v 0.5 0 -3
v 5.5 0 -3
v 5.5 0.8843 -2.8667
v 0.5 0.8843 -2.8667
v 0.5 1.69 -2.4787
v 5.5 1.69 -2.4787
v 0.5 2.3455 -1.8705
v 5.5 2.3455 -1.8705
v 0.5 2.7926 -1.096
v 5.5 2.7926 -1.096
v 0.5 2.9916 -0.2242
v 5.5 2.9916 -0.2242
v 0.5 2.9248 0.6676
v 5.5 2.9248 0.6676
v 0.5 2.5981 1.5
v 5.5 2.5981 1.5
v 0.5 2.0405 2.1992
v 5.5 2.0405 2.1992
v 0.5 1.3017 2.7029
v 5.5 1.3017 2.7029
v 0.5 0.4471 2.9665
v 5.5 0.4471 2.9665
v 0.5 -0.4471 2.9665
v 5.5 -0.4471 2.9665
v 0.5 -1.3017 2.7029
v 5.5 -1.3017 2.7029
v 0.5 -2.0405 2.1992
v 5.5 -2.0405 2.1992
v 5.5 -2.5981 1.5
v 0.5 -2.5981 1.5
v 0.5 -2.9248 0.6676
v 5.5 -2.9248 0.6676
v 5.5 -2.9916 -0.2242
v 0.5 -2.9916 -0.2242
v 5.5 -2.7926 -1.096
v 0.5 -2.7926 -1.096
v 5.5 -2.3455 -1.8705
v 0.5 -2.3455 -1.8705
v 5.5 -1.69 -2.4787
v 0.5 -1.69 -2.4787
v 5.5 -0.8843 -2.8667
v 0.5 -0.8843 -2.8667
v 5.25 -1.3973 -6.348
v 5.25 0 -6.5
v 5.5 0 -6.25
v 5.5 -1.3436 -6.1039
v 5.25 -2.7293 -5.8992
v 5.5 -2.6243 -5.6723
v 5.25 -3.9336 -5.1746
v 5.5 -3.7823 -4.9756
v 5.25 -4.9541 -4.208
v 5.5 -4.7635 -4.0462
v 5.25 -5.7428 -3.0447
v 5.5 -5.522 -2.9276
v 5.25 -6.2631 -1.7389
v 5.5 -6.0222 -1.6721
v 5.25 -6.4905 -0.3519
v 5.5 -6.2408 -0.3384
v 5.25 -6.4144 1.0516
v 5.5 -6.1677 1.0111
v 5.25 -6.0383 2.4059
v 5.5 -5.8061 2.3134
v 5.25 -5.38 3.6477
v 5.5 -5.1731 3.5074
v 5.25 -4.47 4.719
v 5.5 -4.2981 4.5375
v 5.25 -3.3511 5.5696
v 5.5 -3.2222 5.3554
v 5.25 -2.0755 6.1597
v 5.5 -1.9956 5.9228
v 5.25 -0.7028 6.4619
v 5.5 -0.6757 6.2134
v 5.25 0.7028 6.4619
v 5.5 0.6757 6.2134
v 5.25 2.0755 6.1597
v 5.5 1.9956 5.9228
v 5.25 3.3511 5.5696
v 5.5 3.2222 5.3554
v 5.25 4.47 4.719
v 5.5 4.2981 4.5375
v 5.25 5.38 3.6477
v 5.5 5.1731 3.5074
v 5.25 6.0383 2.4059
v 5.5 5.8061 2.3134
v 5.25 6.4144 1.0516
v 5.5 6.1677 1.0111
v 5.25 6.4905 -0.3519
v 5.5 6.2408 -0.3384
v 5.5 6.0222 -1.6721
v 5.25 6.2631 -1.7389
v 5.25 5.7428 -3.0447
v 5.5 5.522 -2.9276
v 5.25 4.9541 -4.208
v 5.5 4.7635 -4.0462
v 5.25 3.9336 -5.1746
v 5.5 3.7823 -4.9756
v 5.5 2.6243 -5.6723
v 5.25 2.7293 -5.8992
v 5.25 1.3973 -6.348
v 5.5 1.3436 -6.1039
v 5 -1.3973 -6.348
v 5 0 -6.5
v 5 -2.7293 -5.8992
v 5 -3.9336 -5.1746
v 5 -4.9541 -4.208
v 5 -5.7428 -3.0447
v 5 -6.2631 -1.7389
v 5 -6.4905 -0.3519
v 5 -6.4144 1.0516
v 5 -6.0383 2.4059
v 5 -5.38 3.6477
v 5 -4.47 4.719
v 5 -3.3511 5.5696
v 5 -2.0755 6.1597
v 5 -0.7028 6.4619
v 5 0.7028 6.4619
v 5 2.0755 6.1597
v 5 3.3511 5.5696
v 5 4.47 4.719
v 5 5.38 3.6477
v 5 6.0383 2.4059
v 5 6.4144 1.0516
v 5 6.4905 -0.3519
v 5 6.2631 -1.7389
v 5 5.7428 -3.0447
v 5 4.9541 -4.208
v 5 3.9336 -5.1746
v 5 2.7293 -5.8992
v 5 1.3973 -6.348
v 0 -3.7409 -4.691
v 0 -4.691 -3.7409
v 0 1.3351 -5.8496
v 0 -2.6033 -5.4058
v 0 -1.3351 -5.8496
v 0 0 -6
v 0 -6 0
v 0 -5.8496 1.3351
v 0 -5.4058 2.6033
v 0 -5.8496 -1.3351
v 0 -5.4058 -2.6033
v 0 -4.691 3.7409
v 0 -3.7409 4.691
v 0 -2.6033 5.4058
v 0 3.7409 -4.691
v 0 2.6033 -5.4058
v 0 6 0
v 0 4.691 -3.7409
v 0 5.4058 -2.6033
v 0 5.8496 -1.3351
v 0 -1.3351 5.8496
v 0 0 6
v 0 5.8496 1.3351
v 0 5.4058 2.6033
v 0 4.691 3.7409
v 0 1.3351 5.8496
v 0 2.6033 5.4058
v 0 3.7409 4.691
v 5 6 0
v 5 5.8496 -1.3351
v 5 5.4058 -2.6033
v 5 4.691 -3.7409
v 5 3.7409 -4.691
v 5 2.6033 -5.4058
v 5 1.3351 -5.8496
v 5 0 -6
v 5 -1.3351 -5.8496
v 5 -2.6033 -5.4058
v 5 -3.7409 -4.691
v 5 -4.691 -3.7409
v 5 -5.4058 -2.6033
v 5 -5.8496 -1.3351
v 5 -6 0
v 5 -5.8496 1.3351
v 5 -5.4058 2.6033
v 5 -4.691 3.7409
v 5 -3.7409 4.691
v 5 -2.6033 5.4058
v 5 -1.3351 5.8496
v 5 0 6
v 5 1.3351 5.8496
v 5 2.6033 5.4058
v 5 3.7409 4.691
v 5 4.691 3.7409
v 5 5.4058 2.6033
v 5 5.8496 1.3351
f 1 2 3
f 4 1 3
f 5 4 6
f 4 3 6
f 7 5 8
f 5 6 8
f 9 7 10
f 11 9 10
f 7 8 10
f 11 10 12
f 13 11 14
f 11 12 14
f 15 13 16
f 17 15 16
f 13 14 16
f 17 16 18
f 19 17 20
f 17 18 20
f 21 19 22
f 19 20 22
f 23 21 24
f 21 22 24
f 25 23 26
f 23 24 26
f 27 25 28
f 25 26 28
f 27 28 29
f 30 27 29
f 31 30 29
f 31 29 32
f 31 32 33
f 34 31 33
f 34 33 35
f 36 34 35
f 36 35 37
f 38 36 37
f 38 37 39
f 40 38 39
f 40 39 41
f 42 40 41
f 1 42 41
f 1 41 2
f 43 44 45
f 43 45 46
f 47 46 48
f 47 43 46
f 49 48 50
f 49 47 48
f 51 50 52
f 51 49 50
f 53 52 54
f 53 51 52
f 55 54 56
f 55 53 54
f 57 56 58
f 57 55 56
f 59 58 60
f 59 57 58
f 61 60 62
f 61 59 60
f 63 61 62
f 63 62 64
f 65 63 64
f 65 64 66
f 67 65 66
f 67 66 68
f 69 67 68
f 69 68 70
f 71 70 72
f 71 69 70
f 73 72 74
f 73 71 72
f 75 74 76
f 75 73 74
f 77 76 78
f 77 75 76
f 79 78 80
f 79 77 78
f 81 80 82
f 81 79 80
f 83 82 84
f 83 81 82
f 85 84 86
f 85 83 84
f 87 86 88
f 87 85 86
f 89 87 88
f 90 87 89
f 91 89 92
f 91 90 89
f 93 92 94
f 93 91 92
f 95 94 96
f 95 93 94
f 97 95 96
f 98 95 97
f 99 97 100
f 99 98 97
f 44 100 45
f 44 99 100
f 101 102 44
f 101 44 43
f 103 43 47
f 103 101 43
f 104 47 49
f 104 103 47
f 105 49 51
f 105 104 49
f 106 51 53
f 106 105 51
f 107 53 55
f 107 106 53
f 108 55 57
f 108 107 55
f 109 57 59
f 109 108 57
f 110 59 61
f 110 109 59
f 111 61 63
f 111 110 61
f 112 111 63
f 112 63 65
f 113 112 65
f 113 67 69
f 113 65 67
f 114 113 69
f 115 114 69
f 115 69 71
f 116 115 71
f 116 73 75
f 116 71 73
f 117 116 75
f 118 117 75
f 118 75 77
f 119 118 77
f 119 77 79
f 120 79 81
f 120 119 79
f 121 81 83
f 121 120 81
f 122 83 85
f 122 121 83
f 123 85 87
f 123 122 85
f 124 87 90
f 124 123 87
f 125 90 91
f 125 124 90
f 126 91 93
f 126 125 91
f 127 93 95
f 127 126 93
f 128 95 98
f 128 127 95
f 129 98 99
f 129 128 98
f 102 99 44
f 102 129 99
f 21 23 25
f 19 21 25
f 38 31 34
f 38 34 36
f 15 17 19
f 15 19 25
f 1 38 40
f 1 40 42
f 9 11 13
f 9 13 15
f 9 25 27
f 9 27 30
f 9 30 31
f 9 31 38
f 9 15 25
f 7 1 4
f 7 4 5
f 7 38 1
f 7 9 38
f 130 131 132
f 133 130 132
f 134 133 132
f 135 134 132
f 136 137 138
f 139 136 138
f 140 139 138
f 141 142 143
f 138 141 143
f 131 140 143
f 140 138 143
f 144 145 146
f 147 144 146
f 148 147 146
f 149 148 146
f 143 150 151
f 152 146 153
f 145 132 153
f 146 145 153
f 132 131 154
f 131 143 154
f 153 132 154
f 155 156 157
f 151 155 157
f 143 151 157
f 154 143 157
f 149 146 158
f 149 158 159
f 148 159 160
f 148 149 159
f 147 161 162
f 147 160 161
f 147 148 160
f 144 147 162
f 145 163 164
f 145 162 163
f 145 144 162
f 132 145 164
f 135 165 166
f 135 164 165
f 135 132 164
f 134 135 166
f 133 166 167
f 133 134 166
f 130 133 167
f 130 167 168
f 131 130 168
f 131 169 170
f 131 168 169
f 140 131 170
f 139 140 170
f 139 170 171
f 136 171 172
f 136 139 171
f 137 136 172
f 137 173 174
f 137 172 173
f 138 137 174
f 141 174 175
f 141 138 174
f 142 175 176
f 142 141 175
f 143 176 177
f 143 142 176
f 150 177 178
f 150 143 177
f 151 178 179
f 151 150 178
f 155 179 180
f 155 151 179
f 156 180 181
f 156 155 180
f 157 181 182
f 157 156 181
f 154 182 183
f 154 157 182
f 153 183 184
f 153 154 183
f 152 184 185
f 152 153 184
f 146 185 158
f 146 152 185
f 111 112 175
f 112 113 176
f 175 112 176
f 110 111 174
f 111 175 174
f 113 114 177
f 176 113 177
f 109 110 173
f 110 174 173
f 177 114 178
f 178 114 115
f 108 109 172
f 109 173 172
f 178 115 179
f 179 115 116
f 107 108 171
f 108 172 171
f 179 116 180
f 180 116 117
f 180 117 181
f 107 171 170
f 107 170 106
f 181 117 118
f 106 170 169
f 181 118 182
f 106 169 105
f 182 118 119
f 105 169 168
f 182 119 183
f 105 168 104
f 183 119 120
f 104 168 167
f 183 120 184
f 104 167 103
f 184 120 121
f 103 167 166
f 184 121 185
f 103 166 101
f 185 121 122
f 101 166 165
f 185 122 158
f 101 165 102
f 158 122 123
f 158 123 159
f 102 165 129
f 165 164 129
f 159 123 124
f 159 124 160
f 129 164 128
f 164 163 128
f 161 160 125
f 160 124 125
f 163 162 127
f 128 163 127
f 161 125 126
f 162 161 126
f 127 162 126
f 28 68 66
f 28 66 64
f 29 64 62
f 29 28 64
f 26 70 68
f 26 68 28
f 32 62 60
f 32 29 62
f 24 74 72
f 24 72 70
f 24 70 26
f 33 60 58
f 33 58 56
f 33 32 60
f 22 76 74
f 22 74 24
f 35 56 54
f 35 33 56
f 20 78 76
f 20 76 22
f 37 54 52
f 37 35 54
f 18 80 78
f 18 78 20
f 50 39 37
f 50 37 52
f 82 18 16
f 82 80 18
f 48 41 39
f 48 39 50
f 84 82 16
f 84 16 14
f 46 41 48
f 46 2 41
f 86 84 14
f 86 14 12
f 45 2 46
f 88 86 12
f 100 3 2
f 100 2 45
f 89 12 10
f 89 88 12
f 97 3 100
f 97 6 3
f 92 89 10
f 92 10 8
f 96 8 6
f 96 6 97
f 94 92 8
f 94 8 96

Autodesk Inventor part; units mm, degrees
ref_plane "YZ Plane" through (0, 0, 0) normal (1, 0, 0) x (0, 1, 0)
ref_plane "XZ Plane" through (0, 0, 0) normal (0, 1, 0) x (-1, 0, 0)
ref_plane "XY Plane" through (0, 0, 0) normal (0, 0, 1) x (1, 0, 0)
sketch "Sketch1" plane through (0, 0, 0) normal (1, 0, 0) x (0, 1, 0)
  circle A0 centre (0, 0) radius 6
  dimension "d0" = 12
extrude "Extrusion1" add sketch "Sketch1" along normal blind 5
sketch "Sketch2" plane through (5, 0, 0) normal (1, 0, 0) x (0, 0, -1)
  circle A0 centre (0, 0) radius 6 projected
  circle A1 centre (0, 0) radius 6.5
  dimension "d3" = 13
extrude "Extrusion2" add sketch "Sketch2" along normal blind 0.5 contours A0 | A1
chamfer "Chamfer1" distance 0.25 angle 45 1 edges at (5.5, 0, 6.5)
sketch "Sketch3" plane through (5.5, 0, 0) normal (1, 0, 0) x (0, 0, -1)
  circle A0 centre (0, 0) radius 6.25 projected
  circle A1 centre (0, 0) radius 3
  dimension "d9" = 6
extrude "Extrusion3" cut sketch "Sketch3" against normal blind 5 contours A1
properties part number "500-138" material "ABS Plastic"
